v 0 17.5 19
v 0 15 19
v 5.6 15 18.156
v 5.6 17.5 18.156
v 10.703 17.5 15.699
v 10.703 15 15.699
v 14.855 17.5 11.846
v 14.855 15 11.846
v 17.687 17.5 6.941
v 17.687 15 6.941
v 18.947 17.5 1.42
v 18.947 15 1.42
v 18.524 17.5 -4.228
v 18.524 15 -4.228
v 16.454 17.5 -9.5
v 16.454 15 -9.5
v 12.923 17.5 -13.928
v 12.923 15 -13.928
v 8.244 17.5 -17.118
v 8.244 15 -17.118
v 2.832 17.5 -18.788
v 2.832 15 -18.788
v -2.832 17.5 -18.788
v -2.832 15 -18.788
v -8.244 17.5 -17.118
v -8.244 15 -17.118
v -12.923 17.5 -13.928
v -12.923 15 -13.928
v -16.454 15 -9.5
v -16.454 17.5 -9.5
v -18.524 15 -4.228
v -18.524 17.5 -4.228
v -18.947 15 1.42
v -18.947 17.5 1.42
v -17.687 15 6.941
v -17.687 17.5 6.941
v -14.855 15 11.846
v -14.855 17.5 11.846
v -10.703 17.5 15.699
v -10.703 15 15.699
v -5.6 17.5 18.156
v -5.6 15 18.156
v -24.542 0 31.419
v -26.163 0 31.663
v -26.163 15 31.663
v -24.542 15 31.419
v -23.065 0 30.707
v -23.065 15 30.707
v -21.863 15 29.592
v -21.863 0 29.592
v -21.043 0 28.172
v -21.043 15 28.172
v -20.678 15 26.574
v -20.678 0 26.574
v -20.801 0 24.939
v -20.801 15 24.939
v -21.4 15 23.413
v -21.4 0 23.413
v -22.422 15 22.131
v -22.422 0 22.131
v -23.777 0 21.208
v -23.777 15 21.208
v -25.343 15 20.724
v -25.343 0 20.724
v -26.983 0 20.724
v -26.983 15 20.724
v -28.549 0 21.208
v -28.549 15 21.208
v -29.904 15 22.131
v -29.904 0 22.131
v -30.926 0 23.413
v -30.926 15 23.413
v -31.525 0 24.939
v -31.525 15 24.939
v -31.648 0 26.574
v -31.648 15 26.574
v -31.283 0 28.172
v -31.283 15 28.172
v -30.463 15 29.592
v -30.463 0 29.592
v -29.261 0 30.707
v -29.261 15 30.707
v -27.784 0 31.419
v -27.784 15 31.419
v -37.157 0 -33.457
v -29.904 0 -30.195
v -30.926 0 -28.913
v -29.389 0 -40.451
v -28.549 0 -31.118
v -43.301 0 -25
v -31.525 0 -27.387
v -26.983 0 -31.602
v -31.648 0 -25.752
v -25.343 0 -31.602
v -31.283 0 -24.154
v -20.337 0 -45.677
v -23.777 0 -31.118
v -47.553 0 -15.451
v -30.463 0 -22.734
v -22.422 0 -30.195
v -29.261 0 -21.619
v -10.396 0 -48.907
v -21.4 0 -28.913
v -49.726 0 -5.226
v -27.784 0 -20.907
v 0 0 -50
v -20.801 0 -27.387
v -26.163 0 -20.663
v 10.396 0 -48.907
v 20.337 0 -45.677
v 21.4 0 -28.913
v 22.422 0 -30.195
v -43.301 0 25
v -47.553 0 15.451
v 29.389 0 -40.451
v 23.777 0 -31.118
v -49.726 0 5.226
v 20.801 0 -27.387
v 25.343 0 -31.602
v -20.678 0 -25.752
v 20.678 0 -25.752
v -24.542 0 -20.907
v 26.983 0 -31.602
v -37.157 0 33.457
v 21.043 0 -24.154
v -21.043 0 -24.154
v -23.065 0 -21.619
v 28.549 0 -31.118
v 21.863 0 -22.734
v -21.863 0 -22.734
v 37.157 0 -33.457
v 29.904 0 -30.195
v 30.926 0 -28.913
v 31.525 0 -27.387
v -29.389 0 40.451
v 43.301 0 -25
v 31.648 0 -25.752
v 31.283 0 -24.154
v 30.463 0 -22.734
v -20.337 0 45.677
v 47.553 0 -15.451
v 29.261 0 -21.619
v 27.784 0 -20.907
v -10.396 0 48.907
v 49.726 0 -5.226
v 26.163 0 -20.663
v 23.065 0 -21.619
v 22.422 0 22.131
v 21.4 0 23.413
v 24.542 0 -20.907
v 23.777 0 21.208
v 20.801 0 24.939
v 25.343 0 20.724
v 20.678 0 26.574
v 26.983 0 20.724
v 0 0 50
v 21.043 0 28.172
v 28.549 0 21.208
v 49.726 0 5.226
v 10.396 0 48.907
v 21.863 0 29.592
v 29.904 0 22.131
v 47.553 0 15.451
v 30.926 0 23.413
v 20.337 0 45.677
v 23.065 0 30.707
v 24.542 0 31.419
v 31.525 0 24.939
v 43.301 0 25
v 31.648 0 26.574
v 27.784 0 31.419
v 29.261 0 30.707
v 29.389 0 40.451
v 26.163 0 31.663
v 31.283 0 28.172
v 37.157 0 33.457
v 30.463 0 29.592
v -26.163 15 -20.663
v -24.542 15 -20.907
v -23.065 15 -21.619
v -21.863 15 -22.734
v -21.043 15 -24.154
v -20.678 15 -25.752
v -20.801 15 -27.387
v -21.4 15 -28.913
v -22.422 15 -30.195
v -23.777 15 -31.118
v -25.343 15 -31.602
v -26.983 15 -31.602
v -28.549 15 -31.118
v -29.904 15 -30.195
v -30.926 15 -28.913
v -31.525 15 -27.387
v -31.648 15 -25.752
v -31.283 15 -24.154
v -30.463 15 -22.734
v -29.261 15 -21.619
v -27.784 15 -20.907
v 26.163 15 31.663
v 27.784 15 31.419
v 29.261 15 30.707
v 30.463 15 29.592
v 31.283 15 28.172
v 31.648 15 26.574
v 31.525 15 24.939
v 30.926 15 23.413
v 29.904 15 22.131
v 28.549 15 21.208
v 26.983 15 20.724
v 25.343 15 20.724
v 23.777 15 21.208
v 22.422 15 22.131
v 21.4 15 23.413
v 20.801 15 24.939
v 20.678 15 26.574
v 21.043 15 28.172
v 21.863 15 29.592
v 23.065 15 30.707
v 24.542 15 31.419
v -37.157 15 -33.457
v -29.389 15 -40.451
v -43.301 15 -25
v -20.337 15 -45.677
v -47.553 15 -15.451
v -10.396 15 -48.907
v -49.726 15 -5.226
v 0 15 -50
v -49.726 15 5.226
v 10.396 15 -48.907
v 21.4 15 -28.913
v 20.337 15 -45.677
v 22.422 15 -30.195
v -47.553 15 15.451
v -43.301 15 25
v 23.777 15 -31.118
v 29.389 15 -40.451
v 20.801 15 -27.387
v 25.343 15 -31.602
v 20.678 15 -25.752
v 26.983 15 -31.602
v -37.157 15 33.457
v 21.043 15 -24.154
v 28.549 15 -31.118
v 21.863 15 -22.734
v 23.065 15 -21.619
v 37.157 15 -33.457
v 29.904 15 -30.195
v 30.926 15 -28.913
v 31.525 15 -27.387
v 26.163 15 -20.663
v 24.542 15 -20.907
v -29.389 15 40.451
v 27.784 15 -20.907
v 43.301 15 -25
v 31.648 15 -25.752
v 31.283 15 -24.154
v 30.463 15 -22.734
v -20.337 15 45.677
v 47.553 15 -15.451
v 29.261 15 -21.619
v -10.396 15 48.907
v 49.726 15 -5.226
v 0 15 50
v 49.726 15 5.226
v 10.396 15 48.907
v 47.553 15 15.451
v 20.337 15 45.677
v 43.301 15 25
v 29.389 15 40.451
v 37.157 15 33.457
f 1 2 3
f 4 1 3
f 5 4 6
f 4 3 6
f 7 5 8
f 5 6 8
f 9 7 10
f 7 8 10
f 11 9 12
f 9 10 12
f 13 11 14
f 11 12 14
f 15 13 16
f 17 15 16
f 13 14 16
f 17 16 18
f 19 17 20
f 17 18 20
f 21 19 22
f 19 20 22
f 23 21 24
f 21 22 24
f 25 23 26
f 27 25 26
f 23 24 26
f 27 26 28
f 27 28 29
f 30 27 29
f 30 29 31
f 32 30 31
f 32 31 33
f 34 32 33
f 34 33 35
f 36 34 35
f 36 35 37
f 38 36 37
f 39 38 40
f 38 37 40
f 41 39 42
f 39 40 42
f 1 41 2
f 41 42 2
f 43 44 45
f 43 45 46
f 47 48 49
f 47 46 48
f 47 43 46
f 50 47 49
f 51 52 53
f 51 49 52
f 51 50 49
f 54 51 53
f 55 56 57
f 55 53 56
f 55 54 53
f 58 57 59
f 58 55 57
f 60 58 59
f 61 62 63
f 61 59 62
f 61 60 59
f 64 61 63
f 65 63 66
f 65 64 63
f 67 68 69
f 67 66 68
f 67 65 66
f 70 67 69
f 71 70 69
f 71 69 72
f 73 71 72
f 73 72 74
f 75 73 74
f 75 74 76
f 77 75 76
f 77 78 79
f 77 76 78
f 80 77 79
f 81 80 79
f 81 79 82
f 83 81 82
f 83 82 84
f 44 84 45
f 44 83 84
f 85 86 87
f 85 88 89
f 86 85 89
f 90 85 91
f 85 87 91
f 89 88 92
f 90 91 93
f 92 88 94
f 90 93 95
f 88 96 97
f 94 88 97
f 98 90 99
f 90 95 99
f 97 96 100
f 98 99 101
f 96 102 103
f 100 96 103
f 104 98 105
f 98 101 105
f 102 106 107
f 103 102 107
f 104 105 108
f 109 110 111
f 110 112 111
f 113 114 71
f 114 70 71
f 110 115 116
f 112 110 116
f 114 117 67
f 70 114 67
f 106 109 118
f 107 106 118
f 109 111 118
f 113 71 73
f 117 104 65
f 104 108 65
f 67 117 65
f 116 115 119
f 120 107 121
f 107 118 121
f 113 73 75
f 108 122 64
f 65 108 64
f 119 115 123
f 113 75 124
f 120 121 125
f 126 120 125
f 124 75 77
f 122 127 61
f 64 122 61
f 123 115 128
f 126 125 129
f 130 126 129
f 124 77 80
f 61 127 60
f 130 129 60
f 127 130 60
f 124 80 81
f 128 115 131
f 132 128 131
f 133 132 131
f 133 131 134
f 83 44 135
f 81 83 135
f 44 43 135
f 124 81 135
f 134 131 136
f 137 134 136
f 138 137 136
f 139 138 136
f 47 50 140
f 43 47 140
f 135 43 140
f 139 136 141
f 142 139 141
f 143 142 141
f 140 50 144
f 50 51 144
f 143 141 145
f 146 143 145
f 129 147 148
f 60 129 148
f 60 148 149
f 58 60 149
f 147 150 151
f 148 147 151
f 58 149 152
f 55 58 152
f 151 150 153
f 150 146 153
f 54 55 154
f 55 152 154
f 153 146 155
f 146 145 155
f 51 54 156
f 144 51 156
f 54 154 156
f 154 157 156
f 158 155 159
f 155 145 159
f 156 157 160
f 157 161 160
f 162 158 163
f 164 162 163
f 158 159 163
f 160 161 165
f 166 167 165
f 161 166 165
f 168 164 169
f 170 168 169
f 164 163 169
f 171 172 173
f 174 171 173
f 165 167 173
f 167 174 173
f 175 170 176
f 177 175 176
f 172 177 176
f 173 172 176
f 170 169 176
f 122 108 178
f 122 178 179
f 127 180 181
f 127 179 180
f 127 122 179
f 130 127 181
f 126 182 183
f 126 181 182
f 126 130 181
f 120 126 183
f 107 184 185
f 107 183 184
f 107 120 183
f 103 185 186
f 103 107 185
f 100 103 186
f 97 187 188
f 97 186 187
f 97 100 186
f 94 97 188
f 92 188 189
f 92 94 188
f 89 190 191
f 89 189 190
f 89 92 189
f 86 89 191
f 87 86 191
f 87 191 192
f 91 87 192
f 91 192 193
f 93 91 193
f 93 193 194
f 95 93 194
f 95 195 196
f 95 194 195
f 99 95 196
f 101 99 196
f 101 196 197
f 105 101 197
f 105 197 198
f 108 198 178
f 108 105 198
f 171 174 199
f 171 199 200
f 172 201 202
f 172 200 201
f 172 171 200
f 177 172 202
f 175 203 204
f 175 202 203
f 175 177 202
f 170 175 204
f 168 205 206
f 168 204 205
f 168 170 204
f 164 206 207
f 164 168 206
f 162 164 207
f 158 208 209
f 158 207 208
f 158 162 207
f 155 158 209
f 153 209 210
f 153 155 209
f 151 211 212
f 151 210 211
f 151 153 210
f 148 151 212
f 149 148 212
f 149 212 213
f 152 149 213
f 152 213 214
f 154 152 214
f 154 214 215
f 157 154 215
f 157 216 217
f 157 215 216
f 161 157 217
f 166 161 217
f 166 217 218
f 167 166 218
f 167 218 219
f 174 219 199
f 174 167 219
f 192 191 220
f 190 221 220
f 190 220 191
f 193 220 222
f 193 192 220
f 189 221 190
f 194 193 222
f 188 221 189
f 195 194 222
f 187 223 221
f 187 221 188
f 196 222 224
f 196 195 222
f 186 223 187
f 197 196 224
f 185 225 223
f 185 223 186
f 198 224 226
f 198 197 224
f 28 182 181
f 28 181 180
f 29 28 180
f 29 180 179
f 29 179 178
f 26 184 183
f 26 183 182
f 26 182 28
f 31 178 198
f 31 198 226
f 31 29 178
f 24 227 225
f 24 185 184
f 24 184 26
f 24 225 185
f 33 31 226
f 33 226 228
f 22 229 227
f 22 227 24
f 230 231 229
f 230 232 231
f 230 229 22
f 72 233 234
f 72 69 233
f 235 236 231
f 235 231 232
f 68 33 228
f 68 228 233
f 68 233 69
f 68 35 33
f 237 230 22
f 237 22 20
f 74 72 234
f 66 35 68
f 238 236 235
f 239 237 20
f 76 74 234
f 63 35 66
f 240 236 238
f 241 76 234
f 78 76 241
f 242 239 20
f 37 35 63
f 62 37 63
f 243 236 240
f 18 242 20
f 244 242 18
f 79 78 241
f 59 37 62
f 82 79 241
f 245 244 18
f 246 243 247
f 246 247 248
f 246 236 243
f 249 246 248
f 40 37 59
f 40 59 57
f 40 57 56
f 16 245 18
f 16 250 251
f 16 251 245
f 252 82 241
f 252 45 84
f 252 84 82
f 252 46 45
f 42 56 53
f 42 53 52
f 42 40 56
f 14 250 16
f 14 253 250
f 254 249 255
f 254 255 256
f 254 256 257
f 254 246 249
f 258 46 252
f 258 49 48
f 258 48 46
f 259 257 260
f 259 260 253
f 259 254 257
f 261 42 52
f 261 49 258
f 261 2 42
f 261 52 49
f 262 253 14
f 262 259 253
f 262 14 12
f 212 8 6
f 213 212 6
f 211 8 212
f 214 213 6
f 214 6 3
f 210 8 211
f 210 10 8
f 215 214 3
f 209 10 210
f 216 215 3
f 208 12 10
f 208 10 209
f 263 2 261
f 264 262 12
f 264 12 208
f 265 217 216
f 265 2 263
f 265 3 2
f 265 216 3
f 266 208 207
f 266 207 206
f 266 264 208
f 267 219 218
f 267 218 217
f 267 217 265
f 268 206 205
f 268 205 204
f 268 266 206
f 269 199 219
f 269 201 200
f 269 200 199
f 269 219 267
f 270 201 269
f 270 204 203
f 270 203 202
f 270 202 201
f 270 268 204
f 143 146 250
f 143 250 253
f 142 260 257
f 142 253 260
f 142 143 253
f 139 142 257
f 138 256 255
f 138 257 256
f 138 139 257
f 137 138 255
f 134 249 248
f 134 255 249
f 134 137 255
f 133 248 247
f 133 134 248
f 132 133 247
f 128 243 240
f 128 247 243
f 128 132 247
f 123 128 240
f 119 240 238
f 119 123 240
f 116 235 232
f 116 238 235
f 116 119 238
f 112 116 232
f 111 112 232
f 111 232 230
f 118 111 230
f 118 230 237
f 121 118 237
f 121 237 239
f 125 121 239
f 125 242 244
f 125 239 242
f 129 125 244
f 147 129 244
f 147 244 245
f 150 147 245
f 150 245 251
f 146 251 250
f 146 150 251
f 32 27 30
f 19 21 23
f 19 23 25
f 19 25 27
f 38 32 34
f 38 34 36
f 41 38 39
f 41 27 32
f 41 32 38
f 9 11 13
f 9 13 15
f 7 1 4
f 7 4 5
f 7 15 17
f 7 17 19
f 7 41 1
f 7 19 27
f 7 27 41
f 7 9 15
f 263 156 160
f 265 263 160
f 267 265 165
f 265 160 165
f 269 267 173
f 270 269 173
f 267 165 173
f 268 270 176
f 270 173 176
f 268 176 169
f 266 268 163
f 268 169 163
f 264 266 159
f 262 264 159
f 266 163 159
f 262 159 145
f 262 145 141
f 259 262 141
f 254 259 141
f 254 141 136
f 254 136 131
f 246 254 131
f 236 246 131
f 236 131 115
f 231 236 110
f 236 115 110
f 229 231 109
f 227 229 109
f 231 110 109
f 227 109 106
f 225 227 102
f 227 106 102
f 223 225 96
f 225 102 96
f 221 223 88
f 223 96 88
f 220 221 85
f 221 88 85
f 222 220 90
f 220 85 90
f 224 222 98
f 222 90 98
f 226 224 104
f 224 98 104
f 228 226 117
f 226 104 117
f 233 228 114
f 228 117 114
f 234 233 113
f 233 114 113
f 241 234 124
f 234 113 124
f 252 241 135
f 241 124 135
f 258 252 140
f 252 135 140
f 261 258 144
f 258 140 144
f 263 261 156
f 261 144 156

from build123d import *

# Parameters (mm, degrees)
SKETCH_1_R               = 50
EXTRUDE_1_DEPTH          = 15
SKETCH_2_R               = 19
EXTRUDE_2_DEPTH          = 2.5
CUT_EXTRUDE_1_DEPTH      = 73.284161474
CUT_EXTRUDE_1_DEPTH_BACK = 73.284161474
SKETCH_3_R               = 5.5


with BuildPart() as part:
    # 草图1 → 凸台-拉伸1 (new body)
    with BuildSketch(Plane(origin=(0, 0, 0), x_dir=(1, 0, 0), z_dir=(0, 1, 0))):
        with Locations(Location((0, 0, 0), (0, 0, 270))):
            Circle(SKETCH_1_R)
    extrude(amount=EXTRUDE_1_DEPTH)

    # 草图2 → 凸台-拉伸2 (add)
    with BuildSketch(Plane(origin=(0, 15, 0), x_dir=(1, 0, 0), z_dir=(0, 1, 0))):
        with Locations(Location((0, 0, 0), (0, 0, 270))):
            Circle(SKETCH_2_R)
    extrude(amount=EXTRUDE_2_DEPTH)

    # 草图3 → 切除-拉伸1 (cut, two sides: drawn at the far end of the back side and taken through both)
    with BuildSketch(Plane(origin=(0, 15, 0), x_dir=(1, 0, 0), z_dir=(0, 1, 0)).offset(-CUT_EXTRUDE_1_DEPTH_BACK)):
        with Locations(Location((26.162950904, 26.162950904, 0), (0, 0, 270))):
            Circle(SKETCH_3_R)
        with Locations(Location((26.162950904, -26.162950904, 0), (0, 0, 270))):
            Circle(SKETCH_3_R)
        with Locations(Location((-26.162950904, -26.162950904, 0), (0, 0, 270))):
            Circle(SKETCH_3_R)
        with Locations(Location((-26.162950904, 26.162950904, 0), (0, 0, 270))):
            Circle(SKETCH_3_R)
    extrude(amount=CUT_EXTRUDE_1_DEPTH + CUT_EXTRUDE_1_DEPTH_BACK, mode=Mode.SUBTRACT)


solid = part.part
